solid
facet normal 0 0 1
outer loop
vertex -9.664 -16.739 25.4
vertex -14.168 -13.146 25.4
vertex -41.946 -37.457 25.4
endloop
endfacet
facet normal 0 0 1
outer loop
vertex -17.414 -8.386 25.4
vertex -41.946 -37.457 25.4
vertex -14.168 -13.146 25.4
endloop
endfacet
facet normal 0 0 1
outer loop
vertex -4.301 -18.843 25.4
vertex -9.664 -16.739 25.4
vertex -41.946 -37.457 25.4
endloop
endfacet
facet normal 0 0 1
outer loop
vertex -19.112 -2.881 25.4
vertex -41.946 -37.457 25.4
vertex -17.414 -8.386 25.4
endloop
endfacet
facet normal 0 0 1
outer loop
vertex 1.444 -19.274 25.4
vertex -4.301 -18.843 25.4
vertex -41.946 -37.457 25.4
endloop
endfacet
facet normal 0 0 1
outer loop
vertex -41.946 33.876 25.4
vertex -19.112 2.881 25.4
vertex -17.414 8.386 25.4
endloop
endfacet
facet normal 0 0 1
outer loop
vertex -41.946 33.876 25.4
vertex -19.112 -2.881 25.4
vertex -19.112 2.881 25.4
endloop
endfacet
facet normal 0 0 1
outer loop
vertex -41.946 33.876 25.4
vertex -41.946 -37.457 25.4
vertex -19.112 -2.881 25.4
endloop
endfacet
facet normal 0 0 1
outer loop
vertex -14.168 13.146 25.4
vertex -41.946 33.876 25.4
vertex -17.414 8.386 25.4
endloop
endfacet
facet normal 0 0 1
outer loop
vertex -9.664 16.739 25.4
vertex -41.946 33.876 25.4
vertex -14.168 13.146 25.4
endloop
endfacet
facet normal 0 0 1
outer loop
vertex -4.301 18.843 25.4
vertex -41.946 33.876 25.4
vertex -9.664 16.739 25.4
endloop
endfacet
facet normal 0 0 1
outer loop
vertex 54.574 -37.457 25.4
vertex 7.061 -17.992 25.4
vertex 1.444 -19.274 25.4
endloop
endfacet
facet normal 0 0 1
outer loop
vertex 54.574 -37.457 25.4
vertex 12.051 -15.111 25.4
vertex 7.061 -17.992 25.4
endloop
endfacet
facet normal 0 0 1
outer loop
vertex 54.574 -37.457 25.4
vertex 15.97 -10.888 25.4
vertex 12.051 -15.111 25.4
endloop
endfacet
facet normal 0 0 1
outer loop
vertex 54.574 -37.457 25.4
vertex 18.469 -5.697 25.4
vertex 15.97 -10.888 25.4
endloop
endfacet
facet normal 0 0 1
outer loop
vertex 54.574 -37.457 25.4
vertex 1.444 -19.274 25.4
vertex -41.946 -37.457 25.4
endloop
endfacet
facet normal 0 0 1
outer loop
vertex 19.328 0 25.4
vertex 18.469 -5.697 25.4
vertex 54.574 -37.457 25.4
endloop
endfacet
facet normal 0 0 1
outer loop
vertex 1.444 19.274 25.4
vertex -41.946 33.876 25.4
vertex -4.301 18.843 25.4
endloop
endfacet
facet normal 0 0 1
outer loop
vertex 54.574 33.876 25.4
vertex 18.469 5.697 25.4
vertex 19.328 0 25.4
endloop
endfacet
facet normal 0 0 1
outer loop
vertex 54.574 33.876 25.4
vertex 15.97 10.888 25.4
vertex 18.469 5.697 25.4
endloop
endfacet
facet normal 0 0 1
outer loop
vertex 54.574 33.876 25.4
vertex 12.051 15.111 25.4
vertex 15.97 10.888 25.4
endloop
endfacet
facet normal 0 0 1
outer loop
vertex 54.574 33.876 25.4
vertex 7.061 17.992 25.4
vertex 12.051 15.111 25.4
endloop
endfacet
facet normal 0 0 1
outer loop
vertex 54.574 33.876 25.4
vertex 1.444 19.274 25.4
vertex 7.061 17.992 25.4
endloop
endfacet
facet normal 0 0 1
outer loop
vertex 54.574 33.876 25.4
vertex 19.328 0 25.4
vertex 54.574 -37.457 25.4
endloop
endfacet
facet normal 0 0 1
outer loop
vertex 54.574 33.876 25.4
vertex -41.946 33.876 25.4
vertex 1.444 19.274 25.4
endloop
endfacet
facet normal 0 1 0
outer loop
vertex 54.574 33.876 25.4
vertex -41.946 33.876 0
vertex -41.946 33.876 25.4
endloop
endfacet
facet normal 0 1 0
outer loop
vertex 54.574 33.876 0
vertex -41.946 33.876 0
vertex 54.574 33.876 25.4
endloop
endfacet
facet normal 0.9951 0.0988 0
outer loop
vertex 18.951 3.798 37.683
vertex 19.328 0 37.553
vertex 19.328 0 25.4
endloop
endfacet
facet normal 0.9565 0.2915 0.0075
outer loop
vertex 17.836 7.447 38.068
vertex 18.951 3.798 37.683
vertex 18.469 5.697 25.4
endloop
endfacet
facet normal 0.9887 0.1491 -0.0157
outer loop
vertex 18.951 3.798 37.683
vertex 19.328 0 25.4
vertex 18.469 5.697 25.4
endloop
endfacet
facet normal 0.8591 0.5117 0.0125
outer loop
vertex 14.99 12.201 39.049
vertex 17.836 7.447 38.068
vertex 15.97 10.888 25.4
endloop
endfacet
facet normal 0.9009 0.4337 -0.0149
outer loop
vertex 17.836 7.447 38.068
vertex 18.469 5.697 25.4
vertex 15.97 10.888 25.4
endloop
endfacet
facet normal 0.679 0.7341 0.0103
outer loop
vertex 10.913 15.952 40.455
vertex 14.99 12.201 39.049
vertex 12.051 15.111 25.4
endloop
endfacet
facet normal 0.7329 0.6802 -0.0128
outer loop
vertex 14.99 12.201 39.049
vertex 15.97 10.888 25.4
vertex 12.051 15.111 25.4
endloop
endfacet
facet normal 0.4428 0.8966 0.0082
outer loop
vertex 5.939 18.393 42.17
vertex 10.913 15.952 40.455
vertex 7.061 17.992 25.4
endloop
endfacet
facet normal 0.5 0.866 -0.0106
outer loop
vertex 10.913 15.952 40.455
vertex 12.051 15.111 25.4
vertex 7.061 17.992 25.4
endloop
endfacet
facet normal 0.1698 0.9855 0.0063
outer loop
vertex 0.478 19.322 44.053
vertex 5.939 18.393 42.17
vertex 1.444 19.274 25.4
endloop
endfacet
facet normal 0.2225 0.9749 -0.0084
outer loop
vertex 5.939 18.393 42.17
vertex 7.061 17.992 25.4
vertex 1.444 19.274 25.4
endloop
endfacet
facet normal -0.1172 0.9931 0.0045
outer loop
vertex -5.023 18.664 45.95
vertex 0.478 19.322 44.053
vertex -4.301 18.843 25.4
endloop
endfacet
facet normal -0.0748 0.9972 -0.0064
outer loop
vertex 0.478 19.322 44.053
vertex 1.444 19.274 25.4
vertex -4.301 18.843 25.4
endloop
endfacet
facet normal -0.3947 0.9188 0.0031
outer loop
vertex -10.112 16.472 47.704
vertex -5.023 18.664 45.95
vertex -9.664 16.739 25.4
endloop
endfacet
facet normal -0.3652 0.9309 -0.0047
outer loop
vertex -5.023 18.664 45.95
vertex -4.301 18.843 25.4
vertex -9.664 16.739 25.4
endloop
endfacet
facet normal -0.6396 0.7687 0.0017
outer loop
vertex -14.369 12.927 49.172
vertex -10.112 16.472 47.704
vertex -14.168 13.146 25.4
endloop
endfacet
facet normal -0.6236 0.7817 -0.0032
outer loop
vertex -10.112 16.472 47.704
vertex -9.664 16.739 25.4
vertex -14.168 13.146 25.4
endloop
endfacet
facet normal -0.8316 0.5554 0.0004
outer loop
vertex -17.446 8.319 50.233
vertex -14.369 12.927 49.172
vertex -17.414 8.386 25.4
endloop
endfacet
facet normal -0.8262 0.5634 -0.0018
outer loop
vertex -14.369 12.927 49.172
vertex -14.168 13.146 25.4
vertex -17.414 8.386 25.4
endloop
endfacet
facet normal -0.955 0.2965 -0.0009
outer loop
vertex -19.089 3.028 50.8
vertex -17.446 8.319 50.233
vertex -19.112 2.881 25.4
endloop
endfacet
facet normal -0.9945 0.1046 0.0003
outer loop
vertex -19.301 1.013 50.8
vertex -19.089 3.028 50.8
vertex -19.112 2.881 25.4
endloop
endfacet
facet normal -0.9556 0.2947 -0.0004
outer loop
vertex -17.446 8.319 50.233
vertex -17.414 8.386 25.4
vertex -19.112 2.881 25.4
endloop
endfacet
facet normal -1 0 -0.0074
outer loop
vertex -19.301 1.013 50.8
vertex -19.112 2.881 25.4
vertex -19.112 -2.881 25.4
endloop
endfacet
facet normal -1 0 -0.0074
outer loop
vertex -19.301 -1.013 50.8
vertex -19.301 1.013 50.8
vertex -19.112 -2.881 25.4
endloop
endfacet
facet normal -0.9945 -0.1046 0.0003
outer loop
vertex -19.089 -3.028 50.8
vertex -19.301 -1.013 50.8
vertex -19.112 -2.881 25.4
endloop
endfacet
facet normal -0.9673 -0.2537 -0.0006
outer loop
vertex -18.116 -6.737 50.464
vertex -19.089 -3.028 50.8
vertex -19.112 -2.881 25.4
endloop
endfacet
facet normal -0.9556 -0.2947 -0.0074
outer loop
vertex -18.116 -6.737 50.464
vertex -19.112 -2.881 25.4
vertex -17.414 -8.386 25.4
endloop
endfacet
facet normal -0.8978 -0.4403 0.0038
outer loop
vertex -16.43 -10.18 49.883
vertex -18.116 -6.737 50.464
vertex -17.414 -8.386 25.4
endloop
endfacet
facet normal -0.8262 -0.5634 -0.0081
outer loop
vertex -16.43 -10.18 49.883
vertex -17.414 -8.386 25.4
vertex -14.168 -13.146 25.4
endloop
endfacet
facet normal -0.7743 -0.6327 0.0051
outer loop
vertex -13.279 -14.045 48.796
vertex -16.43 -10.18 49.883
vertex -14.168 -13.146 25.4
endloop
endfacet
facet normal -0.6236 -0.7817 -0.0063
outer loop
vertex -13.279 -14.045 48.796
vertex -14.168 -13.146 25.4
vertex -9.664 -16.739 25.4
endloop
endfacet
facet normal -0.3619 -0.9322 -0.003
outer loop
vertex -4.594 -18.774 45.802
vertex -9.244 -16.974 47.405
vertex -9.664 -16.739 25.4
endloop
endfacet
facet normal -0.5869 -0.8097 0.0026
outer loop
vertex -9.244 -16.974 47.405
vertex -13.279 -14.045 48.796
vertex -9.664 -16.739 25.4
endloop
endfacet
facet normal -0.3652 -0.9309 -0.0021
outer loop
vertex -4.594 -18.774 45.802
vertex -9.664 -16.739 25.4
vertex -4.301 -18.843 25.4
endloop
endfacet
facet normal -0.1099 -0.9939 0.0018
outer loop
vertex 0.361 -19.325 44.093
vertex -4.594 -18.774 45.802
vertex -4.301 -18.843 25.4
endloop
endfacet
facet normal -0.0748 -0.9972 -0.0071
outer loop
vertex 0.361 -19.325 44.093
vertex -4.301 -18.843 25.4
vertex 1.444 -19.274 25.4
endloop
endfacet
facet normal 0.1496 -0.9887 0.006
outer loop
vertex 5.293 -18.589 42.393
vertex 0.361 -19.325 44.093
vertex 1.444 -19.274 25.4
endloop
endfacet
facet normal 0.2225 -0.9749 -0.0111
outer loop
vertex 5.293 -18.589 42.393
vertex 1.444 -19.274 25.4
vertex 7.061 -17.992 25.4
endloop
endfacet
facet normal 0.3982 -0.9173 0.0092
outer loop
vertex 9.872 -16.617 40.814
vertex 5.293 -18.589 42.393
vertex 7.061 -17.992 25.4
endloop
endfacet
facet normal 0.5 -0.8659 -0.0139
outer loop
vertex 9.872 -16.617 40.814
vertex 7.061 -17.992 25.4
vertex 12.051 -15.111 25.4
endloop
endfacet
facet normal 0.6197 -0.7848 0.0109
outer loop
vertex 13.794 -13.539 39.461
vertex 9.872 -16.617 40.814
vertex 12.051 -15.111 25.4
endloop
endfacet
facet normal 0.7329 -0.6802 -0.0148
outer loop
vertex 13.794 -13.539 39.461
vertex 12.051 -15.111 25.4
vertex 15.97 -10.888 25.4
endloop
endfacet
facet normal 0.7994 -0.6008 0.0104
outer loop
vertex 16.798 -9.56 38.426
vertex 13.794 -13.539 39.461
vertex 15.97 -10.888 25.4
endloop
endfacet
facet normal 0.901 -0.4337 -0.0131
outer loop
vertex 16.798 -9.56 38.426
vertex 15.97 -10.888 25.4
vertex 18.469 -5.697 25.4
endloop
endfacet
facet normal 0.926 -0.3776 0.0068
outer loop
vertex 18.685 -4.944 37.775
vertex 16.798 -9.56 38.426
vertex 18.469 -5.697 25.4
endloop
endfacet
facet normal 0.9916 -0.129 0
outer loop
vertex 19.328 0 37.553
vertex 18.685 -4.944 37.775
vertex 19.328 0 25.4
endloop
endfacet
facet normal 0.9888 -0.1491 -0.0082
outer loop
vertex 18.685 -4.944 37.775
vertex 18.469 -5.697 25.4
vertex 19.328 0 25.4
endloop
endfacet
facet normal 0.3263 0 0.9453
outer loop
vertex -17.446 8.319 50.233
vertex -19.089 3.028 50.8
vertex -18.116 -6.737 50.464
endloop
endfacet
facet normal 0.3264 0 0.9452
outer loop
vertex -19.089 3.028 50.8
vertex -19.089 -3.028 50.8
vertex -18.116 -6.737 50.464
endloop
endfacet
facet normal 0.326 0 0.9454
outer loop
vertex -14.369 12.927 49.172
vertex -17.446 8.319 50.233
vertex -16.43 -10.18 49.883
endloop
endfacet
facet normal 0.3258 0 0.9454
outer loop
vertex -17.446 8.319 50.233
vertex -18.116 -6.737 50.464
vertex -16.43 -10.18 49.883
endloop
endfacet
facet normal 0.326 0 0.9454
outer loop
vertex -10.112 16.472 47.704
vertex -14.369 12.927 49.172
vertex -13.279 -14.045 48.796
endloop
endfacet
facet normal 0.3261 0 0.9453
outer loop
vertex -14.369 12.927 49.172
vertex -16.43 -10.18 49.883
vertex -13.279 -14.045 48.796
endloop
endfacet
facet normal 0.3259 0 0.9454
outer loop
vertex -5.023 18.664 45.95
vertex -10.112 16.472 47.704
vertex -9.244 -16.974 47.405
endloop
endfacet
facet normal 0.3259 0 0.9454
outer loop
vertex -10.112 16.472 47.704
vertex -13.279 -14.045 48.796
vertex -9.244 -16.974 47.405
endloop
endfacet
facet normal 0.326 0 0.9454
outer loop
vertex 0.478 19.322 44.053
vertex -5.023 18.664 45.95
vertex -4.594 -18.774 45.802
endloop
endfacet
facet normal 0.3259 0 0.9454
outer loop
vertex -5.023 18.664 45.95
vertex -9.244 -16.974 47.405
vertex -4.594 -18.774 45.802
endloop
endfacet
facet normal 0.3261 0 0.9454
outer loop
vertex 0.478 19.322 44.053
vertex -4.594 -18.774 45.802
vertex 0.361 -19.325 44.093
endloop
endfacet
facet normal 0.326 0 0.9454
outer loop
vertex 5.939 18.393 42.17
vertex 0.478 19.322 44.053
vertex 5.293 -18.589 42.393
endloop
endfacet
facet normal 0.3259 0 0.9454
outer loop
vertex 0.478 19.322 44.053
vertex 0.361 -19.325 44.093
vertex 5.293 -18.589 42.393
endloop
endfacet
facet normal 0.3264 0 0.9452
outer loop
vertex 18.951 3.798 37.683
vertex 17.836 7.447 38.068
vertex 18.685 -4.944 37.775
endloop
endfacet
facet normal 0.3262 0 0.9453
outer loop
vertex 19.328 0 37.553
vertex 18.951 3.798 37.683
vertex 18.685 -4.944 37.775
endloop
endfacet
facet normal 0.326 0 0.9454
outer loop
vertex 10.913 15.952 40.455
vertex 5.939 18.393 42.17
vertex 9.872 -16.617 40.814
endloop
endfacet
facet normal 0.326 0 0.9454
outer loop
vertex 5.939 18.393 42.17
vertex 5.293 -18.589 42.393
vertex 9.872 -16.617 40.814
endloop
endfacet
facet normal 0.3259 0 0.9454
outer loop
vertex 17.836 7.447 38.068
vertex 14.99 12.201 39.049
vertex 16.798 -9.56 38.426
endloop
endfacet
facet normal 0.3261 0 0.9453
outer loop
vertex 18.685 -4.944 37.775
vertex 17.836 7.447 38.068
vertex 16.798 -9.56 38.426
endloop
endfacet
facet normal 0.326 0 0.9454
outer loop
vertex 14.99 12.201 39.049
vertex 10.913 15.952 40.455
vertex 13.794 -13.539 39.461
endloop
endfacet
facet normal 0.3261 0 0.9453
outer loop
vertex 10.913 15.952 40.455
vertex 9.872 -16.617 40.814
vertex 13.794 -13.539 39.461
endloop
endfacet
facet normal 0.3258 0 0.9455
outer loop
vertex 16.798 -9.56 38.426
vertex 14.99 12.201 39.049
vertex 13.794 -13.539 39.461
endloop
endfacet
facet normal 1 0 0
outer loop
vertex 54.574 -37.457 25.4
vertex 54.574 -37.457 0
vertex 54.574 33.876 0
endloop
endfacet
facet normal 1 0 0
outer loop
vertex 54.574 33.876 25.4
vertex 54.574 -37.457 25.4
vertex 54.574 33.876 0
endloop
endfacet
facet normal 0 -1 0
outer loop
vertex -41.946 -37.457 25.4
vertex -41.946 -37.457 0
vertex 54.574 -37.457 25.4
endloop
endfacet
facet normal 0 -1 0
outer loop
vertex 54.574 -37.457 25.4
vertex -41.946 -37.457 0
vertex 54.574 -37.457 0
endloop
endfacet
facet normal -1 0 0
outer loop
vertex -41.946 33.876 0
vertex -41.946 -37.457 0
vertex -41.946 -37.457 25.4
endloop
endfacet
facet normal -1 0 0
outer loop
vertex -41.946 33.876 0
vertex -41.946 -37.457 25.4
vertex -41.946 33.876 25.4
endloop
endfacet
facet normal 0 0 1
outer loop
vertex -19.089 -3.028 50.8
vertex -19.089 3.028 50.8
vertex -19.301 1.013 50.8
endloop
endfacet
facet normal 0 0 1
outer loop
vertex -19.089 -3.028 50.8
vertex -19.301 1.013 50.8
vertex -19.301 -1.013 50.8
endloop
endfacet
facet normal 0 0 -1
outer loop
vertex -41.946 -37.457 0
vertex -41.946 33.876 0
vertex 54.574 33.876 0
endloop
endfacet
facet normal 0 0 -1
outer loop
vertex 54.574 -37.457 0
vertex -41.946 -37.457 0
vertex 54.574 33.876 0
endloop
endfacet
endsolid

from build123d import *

# Parameters (mm, degrees)
F0_W     = 96.52
F0_H     = 71.332879
F1_DEPTH = 25.4
F2_R     = 19.327986
F3_DEPTH = 25.4
F5_DEPTH = 71.333879


with BuildPart() as f1:
    # F0 (on Top) → F1 (new body)
    with BuildSketch(Plane.XY):
        with Locations((6.314097, -1.790567)):
            Rectangle(F0_W, F0_H)
    extrude(amount=F1_DEPTH)

    # F2 (on face) → F3 (join)
    with BuildSketch(Plane.XY.offset(25.4)):
        Circle(F2_R)
    extrude(amount=F3_DEPTH)

    # F4 (on face) → F5 (cut, through all)
    with BuildSketch(Plane.XZ.offset(37.457006)):
        Polygon((-20.252686, 51.20115), (54.574097, 25.4), (54.574097, 51.20115), align=None)
    extrude(amount=-F5_DEPTH, mode=Mode.SUBTRACT)


solid = f1.part
